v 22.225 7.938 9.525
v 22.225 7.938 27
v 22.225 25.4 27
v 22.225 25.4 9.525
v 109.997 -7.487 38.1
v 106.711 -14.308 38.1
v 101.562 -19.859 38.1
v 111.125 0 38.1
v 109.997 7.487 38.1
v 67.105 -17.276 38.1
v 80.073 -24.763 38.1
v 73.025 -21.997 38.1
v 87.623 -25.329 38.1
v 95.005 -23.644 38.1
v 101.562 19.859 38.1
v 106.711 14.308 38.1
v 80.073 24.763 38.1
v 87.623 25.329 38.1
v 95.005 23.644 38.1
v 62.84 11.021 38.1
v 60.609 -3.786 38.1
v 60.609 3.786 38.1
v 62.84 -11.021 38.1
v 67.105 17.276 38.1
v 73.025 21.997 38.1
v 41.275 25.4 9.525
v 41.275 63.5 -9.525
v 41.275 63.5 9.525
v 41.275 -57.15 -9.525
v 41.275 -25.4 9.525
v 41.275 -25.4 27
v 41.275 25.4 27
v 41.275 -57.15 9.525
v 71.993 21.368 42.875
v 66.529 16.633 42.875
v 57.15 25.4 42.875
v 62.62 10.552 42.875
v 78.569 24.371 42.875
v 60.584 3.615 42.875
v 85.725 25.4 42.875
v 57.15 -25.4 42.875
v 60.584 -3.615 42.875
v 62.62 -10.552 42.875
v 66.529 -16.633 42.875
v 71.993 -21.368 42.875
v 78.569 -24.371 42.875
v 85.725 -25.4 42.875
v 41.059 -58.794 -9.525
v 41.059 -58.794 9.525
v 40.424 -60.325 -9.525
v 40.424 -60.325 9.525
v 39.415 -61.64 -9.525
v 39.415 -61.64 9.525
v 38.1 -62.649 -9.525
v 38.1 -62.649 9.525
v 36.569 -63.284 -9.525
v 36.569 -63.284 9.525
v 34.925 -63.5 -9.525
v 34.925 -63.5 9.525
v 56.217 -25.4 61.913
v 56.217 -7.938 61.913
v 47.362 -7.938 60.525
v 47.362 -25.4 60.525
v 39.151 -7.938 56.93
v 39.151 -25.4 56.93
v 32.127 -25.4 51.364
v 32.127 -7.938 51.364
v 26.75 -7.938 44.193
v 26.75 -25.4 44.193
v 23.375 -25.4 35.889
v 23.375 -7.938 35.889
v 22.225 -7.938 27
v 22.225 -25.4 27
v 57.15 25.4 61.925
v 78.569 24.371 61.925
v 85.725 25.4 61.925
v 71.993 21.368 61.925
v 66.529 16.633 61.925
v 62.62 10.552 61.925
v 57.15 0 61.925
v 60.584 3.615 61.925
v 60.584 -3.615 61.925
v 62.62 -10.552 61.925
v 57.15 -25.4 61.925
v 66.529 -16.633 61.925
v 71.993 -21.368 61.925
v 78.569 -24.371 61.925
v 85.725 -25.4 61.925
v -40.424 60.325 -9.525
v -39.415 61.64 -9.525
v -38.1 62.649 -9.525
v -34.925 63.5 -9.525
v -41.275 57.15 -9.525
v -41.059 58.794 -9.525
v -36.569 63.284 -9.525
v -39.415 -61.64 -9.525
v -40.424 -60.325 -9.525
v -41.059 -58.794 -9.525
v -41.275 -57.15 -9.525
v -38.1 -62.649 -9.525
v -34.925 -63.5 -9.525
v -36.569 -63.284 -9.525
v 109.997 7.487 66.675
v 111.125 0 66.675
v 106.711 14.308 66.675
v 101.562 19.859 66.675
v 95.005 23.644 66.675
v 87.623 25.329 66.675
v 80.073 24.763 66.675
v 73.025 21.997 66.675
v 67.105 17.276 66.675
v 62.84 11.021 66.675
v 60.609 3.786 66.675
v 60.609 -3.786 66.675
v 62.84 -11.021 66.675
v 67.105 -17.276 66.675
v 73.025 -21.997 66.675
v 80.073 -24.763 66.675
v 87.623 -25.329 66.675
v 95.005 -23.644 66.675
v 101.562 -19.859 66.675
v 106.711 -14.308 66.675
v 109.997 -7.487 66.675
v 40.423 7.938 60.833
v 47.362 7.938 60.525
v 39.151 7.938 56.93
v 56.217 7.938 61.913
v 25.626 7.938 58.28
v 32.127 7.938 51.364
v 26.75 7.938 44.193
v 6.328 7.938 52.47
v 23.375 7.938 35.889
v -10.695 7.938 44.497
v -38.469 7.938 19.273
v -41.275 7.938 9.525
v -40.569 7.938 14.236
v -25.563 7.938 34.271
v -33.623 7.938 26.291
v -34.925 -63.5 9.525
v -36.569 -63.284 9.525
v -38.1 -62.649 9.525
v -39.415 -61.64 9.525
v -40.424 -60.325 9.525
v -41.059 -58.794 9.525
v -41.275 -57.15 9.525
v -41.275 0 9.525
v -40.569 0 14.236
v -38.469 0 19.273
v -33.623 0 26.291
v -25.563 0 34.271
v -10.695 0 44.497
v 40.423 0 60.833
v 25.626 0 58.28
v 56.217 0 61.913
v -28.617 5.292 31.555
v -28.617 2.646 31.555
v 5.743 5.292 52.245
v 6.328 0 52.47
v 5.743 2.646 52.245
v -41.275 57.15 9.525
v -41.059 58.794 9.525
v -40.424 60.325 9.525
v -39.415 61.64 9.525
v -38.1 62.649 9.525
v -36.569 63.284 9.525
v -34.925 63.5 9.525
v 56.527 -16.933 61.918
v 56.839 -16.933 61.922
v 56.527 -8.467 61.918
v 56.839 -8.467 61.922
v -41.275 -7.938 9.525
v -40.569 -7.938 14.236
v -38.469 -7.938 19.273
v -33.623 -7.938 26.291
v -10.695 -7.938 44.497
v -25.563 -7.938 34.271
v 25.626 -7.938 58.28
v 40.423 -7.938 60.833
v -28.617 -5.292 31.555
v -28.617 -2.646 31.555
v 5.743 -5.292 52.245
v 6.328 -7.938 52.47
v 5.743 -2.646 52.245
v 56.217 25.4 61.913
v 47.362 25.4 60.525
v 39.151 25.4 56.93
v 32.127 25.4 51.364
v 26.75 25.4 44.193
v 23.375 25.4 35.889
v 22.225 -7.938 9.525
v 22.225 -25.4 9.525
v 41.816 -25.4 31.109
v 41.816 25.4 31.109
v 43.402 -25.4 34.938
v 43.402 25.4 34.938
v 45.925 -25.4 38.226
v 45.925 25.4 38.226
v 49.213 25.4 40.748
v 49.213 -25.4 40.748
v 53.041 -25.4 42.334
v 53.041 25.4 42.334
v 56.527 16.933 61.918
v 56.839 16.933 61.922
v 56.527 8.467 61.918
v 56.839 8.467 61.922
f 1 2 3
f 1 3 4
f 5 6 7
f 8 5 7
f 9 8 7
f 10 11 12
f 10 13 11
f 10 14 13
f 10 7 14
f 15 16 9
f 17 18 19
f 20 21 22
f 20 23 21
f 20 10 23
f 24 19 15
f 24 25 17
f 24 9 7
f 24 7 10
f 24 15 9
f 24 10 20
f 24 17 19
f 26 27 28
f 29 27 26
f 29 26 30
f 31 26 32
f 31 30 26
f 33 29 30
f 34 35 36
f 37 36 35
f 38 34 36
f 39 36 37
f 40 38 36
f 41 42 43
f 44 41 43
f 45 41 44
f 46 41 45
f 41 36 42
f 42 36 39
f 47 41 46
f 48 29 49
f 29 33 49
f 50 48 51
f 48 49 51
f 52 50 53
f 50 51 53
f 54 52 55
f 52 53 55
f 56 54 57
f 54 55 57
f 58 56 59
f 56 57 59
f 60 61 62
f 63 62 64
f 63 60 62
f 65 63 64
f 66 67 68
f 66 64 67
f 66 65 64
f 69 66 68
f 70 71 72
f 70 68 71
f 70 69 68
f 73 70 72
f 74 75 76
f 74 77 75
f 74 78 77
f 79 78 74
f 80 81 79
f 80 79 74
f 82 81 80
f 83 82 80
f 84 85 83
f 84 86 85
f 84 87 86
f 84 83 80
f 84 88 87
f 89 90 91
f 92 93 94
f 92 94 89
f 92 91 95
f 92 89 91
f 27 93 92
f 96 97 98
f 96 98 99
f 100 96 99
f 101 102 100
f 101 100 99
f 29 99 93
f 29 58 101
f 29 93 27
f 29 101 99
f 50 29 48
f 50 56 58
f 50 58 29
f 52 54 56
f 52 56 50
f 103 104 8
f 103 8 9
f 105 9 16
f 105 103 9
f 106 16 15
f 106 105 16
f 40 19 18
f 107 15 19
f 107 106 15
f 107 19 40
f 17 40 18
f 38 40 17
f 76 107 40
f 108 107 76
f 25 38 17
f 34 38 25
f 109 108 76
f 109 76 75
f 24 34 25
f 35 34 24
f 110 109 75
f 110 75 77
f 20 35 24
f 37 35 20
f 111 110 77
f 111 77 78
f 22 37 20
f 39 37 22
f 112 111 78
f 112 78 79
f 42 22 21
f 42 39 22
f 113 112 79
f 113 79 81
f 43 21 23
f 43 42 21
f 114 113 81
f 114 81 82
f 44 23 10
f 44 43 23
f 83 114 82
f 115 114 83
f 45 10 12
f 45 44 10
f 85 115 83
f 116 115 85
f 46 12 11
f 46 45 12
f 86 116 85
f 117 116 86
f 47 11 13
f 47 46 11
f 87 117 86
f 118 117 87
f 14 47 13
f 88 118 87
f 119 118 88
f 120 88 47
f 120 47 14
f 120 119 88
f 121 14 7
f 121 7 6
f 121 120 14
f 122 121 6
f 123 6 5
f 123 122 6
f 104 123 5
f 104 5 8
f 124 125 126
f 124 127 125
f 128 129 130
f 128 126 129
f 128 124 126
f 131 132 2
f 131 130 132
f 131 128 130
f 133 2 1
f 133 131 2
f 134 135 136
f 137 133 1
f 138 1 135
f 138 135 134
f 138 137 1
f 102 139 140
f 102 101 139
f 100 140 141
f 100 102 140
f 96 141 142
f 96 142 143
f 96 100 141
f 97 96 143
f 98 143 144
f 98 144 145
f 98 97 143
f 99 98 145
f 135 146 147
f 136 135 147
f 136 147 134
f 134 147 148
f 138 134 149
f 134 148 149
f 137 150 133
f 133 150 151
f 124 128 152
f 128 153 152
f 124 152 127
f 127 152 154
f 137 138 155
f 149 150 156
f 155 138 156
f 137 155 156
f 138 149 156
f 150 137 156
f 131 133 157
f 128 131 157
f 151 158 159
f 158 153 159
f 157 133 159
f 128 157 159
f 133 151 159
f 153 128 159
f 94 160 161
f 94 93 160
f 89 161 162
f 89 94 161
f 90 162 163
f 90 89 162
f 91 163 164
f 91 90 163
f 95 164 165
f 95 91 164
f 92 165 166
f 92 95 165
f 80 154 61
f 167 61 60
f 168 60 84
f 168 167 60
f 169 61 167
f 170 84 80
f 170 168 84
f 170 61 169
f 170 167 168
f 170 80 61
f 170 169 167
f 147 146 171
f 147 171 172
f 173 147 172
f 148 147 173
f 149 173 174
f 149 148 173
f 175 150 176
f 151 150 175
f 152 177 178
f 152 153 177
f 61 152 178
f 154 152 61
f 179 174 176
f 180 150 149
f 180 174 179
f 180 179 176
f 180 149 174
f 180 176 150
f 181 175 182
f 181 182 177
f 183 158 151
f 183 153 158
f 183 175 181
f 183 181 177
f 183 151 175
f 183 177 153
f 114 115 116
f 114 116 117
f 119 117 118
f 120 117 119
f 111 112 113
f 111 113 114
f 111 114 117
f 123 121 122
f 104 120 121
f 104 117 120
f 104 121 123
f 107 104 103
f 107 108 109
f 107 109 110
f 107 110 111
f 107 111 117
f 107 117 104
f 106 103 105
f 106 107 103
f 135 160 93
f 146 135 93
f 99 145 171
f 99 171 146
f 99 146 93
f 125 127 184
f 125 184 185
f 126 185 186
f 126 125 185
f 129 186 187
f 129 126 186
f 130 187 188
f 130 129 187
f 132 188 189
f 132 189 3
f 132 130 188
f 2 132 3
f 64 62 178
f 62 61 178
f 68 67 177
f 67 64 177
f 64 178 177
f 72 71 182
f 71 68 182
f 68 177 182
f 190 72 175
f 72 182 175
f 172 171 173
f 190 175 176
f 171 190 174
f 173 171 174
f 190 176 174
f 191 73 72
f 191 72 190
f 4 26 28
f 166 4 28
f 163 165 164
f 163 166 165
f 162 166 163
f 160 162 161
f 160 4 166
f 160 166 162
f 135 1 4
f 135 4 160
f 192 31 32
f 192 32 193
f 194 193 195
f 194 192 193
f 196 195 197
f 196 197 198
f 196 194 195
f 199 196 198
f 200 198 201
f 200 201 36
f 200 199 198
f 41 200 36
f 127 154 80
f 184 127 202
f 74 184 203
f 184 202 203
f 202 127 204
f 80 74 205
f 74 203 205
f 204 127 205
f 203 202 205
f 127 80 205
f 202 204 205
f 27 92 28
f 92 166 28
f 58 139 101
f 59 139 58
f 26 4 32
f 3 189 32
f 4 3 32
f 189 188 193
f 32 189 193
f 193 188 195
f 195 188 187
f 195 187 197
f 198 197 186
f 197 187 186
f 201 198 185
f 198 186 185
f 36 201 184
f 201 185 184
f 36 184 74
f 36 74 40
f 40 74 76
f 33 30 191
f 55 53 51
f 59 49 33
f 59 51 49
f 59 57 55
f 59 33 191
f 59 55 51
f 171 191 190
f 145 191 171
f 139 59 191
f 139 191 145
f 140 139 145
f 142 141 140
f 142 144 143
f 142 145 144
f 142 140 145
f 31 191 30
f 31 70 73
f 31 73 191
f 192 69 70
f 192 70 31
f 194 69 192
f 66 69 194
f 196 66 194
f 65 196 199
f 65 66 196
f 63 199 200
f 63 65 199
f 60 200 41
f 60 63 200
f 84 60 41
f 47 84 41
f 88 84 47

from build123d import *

# Parameters (mm, degrees)
F1_DEPTH = 63.5
F0_W     = 25.4
F0_H     = 19.05
F2_DEPTH = 25.4
F3_DEPTH = 7.9375
F5_R     = 6.35


with BuildPart() as f1:
    # F0 (on Front) → F1 (new body, symmetric)
    with BuildSketch(Plane.XZ):
        Polygon((-41.275, 9.525), (-41.275, -9.525), (41.275, -9.525), (41.275, 9.525), (22.225, 9.525), align=None)
    extrude(amount=F1_DEPTH, both=True)

    # F0 (on Front) → F2 (join, symmetric)
    with BuildSketch(Plane.XZ):
        with BuildLine():
            Line((22.225, 9.525), (41.275, 9.525))
            Line((41.275, 9.525), (41.275, 27.0002))
            ThreePointArc((41.275, 27.0002), (45.9246798487, 38.2255201513), (57.15, 42.8752))
            Line((57.15, 42.8752), (60.325, 42.8752))
            Line((60.325, 42.8752), (60.325, 61.9252))
            Line((60.325, 61.9252), (57.15, 61.9252))
            add(Edge.make_bspline(
                [(56.2167130803, 61.912727845), (56.5273358461, 61.9178208633), (56.8384328672, 61.9219806407), (57.15, 61.9252)],
                knots=[110.8966420493, 110.8966420493, 110.8966420493, 110.8966420493, 111.5045361635, 111.5045361635, 111.5045361635, 111.5045361635], degree=3))
            ThreePointArc((56.2167130803, 61.912727845), (32.1265043342, 51.3637032306), (22.225, 27.0002))
            Line((22.225, 27.0002), (22.225, 9.525))
        make_face()
        with Locations((73.025, 52.4002)):
            Rectangle(F0_W, F0_H)
    extrude(amount=F2_DEPTH, both=True)

    # F0 (on Front) → F3 (join, symmetric)
    with BuildSketch(Plane.XZ):
        with BuildLine():
            add(Edge.make_bspline(
                [(-41.275, 9.525), (-41.332462601, 28.9964285063), (-0.4494412016, 60.9836209238), (56.2167130803, 61.912727845)],
                knots=[0, 0, 0, 0, 110.8966420493, 110.8966420493, 110.8966420493, 110.8966420493], degree=3))
            Line((-41.275, 9.525), (22.225, 9.525))
            Line((22.225, 9.525), (22.225, 27.0002))
            ThreePointArc((22.225, 27.0002), (32.1265043342, 51.3637032306), (56.2167130803, 61.912727845))
        make_face()
    extrude(amount=F3_DEPTH, both=True)

    # F0 (on Front) → F4 (revolve)
    with BuildSketch(Plane.XZ):
        Polygon((85.725, 66.675), (85.725, 61.9252), (85.725, 42.8752), (85.725, 38.1), (111.125, 38.1), (111.125, 66.675), align=None)
    revolve(axis=Axis((85.725, 0, 52.3875), (0, 0, 1)))

    # F5
    f5_edges = [f1.edges().sort_by_distance(p)[0] for p in [
        (41.275, -63.5, 0),
        (-41.275, -63.5, 0),
        (-41.275, 63.5, 0),
    ]]
    fillet(f5_edges, radius=F5_R)


solid = f1.part
